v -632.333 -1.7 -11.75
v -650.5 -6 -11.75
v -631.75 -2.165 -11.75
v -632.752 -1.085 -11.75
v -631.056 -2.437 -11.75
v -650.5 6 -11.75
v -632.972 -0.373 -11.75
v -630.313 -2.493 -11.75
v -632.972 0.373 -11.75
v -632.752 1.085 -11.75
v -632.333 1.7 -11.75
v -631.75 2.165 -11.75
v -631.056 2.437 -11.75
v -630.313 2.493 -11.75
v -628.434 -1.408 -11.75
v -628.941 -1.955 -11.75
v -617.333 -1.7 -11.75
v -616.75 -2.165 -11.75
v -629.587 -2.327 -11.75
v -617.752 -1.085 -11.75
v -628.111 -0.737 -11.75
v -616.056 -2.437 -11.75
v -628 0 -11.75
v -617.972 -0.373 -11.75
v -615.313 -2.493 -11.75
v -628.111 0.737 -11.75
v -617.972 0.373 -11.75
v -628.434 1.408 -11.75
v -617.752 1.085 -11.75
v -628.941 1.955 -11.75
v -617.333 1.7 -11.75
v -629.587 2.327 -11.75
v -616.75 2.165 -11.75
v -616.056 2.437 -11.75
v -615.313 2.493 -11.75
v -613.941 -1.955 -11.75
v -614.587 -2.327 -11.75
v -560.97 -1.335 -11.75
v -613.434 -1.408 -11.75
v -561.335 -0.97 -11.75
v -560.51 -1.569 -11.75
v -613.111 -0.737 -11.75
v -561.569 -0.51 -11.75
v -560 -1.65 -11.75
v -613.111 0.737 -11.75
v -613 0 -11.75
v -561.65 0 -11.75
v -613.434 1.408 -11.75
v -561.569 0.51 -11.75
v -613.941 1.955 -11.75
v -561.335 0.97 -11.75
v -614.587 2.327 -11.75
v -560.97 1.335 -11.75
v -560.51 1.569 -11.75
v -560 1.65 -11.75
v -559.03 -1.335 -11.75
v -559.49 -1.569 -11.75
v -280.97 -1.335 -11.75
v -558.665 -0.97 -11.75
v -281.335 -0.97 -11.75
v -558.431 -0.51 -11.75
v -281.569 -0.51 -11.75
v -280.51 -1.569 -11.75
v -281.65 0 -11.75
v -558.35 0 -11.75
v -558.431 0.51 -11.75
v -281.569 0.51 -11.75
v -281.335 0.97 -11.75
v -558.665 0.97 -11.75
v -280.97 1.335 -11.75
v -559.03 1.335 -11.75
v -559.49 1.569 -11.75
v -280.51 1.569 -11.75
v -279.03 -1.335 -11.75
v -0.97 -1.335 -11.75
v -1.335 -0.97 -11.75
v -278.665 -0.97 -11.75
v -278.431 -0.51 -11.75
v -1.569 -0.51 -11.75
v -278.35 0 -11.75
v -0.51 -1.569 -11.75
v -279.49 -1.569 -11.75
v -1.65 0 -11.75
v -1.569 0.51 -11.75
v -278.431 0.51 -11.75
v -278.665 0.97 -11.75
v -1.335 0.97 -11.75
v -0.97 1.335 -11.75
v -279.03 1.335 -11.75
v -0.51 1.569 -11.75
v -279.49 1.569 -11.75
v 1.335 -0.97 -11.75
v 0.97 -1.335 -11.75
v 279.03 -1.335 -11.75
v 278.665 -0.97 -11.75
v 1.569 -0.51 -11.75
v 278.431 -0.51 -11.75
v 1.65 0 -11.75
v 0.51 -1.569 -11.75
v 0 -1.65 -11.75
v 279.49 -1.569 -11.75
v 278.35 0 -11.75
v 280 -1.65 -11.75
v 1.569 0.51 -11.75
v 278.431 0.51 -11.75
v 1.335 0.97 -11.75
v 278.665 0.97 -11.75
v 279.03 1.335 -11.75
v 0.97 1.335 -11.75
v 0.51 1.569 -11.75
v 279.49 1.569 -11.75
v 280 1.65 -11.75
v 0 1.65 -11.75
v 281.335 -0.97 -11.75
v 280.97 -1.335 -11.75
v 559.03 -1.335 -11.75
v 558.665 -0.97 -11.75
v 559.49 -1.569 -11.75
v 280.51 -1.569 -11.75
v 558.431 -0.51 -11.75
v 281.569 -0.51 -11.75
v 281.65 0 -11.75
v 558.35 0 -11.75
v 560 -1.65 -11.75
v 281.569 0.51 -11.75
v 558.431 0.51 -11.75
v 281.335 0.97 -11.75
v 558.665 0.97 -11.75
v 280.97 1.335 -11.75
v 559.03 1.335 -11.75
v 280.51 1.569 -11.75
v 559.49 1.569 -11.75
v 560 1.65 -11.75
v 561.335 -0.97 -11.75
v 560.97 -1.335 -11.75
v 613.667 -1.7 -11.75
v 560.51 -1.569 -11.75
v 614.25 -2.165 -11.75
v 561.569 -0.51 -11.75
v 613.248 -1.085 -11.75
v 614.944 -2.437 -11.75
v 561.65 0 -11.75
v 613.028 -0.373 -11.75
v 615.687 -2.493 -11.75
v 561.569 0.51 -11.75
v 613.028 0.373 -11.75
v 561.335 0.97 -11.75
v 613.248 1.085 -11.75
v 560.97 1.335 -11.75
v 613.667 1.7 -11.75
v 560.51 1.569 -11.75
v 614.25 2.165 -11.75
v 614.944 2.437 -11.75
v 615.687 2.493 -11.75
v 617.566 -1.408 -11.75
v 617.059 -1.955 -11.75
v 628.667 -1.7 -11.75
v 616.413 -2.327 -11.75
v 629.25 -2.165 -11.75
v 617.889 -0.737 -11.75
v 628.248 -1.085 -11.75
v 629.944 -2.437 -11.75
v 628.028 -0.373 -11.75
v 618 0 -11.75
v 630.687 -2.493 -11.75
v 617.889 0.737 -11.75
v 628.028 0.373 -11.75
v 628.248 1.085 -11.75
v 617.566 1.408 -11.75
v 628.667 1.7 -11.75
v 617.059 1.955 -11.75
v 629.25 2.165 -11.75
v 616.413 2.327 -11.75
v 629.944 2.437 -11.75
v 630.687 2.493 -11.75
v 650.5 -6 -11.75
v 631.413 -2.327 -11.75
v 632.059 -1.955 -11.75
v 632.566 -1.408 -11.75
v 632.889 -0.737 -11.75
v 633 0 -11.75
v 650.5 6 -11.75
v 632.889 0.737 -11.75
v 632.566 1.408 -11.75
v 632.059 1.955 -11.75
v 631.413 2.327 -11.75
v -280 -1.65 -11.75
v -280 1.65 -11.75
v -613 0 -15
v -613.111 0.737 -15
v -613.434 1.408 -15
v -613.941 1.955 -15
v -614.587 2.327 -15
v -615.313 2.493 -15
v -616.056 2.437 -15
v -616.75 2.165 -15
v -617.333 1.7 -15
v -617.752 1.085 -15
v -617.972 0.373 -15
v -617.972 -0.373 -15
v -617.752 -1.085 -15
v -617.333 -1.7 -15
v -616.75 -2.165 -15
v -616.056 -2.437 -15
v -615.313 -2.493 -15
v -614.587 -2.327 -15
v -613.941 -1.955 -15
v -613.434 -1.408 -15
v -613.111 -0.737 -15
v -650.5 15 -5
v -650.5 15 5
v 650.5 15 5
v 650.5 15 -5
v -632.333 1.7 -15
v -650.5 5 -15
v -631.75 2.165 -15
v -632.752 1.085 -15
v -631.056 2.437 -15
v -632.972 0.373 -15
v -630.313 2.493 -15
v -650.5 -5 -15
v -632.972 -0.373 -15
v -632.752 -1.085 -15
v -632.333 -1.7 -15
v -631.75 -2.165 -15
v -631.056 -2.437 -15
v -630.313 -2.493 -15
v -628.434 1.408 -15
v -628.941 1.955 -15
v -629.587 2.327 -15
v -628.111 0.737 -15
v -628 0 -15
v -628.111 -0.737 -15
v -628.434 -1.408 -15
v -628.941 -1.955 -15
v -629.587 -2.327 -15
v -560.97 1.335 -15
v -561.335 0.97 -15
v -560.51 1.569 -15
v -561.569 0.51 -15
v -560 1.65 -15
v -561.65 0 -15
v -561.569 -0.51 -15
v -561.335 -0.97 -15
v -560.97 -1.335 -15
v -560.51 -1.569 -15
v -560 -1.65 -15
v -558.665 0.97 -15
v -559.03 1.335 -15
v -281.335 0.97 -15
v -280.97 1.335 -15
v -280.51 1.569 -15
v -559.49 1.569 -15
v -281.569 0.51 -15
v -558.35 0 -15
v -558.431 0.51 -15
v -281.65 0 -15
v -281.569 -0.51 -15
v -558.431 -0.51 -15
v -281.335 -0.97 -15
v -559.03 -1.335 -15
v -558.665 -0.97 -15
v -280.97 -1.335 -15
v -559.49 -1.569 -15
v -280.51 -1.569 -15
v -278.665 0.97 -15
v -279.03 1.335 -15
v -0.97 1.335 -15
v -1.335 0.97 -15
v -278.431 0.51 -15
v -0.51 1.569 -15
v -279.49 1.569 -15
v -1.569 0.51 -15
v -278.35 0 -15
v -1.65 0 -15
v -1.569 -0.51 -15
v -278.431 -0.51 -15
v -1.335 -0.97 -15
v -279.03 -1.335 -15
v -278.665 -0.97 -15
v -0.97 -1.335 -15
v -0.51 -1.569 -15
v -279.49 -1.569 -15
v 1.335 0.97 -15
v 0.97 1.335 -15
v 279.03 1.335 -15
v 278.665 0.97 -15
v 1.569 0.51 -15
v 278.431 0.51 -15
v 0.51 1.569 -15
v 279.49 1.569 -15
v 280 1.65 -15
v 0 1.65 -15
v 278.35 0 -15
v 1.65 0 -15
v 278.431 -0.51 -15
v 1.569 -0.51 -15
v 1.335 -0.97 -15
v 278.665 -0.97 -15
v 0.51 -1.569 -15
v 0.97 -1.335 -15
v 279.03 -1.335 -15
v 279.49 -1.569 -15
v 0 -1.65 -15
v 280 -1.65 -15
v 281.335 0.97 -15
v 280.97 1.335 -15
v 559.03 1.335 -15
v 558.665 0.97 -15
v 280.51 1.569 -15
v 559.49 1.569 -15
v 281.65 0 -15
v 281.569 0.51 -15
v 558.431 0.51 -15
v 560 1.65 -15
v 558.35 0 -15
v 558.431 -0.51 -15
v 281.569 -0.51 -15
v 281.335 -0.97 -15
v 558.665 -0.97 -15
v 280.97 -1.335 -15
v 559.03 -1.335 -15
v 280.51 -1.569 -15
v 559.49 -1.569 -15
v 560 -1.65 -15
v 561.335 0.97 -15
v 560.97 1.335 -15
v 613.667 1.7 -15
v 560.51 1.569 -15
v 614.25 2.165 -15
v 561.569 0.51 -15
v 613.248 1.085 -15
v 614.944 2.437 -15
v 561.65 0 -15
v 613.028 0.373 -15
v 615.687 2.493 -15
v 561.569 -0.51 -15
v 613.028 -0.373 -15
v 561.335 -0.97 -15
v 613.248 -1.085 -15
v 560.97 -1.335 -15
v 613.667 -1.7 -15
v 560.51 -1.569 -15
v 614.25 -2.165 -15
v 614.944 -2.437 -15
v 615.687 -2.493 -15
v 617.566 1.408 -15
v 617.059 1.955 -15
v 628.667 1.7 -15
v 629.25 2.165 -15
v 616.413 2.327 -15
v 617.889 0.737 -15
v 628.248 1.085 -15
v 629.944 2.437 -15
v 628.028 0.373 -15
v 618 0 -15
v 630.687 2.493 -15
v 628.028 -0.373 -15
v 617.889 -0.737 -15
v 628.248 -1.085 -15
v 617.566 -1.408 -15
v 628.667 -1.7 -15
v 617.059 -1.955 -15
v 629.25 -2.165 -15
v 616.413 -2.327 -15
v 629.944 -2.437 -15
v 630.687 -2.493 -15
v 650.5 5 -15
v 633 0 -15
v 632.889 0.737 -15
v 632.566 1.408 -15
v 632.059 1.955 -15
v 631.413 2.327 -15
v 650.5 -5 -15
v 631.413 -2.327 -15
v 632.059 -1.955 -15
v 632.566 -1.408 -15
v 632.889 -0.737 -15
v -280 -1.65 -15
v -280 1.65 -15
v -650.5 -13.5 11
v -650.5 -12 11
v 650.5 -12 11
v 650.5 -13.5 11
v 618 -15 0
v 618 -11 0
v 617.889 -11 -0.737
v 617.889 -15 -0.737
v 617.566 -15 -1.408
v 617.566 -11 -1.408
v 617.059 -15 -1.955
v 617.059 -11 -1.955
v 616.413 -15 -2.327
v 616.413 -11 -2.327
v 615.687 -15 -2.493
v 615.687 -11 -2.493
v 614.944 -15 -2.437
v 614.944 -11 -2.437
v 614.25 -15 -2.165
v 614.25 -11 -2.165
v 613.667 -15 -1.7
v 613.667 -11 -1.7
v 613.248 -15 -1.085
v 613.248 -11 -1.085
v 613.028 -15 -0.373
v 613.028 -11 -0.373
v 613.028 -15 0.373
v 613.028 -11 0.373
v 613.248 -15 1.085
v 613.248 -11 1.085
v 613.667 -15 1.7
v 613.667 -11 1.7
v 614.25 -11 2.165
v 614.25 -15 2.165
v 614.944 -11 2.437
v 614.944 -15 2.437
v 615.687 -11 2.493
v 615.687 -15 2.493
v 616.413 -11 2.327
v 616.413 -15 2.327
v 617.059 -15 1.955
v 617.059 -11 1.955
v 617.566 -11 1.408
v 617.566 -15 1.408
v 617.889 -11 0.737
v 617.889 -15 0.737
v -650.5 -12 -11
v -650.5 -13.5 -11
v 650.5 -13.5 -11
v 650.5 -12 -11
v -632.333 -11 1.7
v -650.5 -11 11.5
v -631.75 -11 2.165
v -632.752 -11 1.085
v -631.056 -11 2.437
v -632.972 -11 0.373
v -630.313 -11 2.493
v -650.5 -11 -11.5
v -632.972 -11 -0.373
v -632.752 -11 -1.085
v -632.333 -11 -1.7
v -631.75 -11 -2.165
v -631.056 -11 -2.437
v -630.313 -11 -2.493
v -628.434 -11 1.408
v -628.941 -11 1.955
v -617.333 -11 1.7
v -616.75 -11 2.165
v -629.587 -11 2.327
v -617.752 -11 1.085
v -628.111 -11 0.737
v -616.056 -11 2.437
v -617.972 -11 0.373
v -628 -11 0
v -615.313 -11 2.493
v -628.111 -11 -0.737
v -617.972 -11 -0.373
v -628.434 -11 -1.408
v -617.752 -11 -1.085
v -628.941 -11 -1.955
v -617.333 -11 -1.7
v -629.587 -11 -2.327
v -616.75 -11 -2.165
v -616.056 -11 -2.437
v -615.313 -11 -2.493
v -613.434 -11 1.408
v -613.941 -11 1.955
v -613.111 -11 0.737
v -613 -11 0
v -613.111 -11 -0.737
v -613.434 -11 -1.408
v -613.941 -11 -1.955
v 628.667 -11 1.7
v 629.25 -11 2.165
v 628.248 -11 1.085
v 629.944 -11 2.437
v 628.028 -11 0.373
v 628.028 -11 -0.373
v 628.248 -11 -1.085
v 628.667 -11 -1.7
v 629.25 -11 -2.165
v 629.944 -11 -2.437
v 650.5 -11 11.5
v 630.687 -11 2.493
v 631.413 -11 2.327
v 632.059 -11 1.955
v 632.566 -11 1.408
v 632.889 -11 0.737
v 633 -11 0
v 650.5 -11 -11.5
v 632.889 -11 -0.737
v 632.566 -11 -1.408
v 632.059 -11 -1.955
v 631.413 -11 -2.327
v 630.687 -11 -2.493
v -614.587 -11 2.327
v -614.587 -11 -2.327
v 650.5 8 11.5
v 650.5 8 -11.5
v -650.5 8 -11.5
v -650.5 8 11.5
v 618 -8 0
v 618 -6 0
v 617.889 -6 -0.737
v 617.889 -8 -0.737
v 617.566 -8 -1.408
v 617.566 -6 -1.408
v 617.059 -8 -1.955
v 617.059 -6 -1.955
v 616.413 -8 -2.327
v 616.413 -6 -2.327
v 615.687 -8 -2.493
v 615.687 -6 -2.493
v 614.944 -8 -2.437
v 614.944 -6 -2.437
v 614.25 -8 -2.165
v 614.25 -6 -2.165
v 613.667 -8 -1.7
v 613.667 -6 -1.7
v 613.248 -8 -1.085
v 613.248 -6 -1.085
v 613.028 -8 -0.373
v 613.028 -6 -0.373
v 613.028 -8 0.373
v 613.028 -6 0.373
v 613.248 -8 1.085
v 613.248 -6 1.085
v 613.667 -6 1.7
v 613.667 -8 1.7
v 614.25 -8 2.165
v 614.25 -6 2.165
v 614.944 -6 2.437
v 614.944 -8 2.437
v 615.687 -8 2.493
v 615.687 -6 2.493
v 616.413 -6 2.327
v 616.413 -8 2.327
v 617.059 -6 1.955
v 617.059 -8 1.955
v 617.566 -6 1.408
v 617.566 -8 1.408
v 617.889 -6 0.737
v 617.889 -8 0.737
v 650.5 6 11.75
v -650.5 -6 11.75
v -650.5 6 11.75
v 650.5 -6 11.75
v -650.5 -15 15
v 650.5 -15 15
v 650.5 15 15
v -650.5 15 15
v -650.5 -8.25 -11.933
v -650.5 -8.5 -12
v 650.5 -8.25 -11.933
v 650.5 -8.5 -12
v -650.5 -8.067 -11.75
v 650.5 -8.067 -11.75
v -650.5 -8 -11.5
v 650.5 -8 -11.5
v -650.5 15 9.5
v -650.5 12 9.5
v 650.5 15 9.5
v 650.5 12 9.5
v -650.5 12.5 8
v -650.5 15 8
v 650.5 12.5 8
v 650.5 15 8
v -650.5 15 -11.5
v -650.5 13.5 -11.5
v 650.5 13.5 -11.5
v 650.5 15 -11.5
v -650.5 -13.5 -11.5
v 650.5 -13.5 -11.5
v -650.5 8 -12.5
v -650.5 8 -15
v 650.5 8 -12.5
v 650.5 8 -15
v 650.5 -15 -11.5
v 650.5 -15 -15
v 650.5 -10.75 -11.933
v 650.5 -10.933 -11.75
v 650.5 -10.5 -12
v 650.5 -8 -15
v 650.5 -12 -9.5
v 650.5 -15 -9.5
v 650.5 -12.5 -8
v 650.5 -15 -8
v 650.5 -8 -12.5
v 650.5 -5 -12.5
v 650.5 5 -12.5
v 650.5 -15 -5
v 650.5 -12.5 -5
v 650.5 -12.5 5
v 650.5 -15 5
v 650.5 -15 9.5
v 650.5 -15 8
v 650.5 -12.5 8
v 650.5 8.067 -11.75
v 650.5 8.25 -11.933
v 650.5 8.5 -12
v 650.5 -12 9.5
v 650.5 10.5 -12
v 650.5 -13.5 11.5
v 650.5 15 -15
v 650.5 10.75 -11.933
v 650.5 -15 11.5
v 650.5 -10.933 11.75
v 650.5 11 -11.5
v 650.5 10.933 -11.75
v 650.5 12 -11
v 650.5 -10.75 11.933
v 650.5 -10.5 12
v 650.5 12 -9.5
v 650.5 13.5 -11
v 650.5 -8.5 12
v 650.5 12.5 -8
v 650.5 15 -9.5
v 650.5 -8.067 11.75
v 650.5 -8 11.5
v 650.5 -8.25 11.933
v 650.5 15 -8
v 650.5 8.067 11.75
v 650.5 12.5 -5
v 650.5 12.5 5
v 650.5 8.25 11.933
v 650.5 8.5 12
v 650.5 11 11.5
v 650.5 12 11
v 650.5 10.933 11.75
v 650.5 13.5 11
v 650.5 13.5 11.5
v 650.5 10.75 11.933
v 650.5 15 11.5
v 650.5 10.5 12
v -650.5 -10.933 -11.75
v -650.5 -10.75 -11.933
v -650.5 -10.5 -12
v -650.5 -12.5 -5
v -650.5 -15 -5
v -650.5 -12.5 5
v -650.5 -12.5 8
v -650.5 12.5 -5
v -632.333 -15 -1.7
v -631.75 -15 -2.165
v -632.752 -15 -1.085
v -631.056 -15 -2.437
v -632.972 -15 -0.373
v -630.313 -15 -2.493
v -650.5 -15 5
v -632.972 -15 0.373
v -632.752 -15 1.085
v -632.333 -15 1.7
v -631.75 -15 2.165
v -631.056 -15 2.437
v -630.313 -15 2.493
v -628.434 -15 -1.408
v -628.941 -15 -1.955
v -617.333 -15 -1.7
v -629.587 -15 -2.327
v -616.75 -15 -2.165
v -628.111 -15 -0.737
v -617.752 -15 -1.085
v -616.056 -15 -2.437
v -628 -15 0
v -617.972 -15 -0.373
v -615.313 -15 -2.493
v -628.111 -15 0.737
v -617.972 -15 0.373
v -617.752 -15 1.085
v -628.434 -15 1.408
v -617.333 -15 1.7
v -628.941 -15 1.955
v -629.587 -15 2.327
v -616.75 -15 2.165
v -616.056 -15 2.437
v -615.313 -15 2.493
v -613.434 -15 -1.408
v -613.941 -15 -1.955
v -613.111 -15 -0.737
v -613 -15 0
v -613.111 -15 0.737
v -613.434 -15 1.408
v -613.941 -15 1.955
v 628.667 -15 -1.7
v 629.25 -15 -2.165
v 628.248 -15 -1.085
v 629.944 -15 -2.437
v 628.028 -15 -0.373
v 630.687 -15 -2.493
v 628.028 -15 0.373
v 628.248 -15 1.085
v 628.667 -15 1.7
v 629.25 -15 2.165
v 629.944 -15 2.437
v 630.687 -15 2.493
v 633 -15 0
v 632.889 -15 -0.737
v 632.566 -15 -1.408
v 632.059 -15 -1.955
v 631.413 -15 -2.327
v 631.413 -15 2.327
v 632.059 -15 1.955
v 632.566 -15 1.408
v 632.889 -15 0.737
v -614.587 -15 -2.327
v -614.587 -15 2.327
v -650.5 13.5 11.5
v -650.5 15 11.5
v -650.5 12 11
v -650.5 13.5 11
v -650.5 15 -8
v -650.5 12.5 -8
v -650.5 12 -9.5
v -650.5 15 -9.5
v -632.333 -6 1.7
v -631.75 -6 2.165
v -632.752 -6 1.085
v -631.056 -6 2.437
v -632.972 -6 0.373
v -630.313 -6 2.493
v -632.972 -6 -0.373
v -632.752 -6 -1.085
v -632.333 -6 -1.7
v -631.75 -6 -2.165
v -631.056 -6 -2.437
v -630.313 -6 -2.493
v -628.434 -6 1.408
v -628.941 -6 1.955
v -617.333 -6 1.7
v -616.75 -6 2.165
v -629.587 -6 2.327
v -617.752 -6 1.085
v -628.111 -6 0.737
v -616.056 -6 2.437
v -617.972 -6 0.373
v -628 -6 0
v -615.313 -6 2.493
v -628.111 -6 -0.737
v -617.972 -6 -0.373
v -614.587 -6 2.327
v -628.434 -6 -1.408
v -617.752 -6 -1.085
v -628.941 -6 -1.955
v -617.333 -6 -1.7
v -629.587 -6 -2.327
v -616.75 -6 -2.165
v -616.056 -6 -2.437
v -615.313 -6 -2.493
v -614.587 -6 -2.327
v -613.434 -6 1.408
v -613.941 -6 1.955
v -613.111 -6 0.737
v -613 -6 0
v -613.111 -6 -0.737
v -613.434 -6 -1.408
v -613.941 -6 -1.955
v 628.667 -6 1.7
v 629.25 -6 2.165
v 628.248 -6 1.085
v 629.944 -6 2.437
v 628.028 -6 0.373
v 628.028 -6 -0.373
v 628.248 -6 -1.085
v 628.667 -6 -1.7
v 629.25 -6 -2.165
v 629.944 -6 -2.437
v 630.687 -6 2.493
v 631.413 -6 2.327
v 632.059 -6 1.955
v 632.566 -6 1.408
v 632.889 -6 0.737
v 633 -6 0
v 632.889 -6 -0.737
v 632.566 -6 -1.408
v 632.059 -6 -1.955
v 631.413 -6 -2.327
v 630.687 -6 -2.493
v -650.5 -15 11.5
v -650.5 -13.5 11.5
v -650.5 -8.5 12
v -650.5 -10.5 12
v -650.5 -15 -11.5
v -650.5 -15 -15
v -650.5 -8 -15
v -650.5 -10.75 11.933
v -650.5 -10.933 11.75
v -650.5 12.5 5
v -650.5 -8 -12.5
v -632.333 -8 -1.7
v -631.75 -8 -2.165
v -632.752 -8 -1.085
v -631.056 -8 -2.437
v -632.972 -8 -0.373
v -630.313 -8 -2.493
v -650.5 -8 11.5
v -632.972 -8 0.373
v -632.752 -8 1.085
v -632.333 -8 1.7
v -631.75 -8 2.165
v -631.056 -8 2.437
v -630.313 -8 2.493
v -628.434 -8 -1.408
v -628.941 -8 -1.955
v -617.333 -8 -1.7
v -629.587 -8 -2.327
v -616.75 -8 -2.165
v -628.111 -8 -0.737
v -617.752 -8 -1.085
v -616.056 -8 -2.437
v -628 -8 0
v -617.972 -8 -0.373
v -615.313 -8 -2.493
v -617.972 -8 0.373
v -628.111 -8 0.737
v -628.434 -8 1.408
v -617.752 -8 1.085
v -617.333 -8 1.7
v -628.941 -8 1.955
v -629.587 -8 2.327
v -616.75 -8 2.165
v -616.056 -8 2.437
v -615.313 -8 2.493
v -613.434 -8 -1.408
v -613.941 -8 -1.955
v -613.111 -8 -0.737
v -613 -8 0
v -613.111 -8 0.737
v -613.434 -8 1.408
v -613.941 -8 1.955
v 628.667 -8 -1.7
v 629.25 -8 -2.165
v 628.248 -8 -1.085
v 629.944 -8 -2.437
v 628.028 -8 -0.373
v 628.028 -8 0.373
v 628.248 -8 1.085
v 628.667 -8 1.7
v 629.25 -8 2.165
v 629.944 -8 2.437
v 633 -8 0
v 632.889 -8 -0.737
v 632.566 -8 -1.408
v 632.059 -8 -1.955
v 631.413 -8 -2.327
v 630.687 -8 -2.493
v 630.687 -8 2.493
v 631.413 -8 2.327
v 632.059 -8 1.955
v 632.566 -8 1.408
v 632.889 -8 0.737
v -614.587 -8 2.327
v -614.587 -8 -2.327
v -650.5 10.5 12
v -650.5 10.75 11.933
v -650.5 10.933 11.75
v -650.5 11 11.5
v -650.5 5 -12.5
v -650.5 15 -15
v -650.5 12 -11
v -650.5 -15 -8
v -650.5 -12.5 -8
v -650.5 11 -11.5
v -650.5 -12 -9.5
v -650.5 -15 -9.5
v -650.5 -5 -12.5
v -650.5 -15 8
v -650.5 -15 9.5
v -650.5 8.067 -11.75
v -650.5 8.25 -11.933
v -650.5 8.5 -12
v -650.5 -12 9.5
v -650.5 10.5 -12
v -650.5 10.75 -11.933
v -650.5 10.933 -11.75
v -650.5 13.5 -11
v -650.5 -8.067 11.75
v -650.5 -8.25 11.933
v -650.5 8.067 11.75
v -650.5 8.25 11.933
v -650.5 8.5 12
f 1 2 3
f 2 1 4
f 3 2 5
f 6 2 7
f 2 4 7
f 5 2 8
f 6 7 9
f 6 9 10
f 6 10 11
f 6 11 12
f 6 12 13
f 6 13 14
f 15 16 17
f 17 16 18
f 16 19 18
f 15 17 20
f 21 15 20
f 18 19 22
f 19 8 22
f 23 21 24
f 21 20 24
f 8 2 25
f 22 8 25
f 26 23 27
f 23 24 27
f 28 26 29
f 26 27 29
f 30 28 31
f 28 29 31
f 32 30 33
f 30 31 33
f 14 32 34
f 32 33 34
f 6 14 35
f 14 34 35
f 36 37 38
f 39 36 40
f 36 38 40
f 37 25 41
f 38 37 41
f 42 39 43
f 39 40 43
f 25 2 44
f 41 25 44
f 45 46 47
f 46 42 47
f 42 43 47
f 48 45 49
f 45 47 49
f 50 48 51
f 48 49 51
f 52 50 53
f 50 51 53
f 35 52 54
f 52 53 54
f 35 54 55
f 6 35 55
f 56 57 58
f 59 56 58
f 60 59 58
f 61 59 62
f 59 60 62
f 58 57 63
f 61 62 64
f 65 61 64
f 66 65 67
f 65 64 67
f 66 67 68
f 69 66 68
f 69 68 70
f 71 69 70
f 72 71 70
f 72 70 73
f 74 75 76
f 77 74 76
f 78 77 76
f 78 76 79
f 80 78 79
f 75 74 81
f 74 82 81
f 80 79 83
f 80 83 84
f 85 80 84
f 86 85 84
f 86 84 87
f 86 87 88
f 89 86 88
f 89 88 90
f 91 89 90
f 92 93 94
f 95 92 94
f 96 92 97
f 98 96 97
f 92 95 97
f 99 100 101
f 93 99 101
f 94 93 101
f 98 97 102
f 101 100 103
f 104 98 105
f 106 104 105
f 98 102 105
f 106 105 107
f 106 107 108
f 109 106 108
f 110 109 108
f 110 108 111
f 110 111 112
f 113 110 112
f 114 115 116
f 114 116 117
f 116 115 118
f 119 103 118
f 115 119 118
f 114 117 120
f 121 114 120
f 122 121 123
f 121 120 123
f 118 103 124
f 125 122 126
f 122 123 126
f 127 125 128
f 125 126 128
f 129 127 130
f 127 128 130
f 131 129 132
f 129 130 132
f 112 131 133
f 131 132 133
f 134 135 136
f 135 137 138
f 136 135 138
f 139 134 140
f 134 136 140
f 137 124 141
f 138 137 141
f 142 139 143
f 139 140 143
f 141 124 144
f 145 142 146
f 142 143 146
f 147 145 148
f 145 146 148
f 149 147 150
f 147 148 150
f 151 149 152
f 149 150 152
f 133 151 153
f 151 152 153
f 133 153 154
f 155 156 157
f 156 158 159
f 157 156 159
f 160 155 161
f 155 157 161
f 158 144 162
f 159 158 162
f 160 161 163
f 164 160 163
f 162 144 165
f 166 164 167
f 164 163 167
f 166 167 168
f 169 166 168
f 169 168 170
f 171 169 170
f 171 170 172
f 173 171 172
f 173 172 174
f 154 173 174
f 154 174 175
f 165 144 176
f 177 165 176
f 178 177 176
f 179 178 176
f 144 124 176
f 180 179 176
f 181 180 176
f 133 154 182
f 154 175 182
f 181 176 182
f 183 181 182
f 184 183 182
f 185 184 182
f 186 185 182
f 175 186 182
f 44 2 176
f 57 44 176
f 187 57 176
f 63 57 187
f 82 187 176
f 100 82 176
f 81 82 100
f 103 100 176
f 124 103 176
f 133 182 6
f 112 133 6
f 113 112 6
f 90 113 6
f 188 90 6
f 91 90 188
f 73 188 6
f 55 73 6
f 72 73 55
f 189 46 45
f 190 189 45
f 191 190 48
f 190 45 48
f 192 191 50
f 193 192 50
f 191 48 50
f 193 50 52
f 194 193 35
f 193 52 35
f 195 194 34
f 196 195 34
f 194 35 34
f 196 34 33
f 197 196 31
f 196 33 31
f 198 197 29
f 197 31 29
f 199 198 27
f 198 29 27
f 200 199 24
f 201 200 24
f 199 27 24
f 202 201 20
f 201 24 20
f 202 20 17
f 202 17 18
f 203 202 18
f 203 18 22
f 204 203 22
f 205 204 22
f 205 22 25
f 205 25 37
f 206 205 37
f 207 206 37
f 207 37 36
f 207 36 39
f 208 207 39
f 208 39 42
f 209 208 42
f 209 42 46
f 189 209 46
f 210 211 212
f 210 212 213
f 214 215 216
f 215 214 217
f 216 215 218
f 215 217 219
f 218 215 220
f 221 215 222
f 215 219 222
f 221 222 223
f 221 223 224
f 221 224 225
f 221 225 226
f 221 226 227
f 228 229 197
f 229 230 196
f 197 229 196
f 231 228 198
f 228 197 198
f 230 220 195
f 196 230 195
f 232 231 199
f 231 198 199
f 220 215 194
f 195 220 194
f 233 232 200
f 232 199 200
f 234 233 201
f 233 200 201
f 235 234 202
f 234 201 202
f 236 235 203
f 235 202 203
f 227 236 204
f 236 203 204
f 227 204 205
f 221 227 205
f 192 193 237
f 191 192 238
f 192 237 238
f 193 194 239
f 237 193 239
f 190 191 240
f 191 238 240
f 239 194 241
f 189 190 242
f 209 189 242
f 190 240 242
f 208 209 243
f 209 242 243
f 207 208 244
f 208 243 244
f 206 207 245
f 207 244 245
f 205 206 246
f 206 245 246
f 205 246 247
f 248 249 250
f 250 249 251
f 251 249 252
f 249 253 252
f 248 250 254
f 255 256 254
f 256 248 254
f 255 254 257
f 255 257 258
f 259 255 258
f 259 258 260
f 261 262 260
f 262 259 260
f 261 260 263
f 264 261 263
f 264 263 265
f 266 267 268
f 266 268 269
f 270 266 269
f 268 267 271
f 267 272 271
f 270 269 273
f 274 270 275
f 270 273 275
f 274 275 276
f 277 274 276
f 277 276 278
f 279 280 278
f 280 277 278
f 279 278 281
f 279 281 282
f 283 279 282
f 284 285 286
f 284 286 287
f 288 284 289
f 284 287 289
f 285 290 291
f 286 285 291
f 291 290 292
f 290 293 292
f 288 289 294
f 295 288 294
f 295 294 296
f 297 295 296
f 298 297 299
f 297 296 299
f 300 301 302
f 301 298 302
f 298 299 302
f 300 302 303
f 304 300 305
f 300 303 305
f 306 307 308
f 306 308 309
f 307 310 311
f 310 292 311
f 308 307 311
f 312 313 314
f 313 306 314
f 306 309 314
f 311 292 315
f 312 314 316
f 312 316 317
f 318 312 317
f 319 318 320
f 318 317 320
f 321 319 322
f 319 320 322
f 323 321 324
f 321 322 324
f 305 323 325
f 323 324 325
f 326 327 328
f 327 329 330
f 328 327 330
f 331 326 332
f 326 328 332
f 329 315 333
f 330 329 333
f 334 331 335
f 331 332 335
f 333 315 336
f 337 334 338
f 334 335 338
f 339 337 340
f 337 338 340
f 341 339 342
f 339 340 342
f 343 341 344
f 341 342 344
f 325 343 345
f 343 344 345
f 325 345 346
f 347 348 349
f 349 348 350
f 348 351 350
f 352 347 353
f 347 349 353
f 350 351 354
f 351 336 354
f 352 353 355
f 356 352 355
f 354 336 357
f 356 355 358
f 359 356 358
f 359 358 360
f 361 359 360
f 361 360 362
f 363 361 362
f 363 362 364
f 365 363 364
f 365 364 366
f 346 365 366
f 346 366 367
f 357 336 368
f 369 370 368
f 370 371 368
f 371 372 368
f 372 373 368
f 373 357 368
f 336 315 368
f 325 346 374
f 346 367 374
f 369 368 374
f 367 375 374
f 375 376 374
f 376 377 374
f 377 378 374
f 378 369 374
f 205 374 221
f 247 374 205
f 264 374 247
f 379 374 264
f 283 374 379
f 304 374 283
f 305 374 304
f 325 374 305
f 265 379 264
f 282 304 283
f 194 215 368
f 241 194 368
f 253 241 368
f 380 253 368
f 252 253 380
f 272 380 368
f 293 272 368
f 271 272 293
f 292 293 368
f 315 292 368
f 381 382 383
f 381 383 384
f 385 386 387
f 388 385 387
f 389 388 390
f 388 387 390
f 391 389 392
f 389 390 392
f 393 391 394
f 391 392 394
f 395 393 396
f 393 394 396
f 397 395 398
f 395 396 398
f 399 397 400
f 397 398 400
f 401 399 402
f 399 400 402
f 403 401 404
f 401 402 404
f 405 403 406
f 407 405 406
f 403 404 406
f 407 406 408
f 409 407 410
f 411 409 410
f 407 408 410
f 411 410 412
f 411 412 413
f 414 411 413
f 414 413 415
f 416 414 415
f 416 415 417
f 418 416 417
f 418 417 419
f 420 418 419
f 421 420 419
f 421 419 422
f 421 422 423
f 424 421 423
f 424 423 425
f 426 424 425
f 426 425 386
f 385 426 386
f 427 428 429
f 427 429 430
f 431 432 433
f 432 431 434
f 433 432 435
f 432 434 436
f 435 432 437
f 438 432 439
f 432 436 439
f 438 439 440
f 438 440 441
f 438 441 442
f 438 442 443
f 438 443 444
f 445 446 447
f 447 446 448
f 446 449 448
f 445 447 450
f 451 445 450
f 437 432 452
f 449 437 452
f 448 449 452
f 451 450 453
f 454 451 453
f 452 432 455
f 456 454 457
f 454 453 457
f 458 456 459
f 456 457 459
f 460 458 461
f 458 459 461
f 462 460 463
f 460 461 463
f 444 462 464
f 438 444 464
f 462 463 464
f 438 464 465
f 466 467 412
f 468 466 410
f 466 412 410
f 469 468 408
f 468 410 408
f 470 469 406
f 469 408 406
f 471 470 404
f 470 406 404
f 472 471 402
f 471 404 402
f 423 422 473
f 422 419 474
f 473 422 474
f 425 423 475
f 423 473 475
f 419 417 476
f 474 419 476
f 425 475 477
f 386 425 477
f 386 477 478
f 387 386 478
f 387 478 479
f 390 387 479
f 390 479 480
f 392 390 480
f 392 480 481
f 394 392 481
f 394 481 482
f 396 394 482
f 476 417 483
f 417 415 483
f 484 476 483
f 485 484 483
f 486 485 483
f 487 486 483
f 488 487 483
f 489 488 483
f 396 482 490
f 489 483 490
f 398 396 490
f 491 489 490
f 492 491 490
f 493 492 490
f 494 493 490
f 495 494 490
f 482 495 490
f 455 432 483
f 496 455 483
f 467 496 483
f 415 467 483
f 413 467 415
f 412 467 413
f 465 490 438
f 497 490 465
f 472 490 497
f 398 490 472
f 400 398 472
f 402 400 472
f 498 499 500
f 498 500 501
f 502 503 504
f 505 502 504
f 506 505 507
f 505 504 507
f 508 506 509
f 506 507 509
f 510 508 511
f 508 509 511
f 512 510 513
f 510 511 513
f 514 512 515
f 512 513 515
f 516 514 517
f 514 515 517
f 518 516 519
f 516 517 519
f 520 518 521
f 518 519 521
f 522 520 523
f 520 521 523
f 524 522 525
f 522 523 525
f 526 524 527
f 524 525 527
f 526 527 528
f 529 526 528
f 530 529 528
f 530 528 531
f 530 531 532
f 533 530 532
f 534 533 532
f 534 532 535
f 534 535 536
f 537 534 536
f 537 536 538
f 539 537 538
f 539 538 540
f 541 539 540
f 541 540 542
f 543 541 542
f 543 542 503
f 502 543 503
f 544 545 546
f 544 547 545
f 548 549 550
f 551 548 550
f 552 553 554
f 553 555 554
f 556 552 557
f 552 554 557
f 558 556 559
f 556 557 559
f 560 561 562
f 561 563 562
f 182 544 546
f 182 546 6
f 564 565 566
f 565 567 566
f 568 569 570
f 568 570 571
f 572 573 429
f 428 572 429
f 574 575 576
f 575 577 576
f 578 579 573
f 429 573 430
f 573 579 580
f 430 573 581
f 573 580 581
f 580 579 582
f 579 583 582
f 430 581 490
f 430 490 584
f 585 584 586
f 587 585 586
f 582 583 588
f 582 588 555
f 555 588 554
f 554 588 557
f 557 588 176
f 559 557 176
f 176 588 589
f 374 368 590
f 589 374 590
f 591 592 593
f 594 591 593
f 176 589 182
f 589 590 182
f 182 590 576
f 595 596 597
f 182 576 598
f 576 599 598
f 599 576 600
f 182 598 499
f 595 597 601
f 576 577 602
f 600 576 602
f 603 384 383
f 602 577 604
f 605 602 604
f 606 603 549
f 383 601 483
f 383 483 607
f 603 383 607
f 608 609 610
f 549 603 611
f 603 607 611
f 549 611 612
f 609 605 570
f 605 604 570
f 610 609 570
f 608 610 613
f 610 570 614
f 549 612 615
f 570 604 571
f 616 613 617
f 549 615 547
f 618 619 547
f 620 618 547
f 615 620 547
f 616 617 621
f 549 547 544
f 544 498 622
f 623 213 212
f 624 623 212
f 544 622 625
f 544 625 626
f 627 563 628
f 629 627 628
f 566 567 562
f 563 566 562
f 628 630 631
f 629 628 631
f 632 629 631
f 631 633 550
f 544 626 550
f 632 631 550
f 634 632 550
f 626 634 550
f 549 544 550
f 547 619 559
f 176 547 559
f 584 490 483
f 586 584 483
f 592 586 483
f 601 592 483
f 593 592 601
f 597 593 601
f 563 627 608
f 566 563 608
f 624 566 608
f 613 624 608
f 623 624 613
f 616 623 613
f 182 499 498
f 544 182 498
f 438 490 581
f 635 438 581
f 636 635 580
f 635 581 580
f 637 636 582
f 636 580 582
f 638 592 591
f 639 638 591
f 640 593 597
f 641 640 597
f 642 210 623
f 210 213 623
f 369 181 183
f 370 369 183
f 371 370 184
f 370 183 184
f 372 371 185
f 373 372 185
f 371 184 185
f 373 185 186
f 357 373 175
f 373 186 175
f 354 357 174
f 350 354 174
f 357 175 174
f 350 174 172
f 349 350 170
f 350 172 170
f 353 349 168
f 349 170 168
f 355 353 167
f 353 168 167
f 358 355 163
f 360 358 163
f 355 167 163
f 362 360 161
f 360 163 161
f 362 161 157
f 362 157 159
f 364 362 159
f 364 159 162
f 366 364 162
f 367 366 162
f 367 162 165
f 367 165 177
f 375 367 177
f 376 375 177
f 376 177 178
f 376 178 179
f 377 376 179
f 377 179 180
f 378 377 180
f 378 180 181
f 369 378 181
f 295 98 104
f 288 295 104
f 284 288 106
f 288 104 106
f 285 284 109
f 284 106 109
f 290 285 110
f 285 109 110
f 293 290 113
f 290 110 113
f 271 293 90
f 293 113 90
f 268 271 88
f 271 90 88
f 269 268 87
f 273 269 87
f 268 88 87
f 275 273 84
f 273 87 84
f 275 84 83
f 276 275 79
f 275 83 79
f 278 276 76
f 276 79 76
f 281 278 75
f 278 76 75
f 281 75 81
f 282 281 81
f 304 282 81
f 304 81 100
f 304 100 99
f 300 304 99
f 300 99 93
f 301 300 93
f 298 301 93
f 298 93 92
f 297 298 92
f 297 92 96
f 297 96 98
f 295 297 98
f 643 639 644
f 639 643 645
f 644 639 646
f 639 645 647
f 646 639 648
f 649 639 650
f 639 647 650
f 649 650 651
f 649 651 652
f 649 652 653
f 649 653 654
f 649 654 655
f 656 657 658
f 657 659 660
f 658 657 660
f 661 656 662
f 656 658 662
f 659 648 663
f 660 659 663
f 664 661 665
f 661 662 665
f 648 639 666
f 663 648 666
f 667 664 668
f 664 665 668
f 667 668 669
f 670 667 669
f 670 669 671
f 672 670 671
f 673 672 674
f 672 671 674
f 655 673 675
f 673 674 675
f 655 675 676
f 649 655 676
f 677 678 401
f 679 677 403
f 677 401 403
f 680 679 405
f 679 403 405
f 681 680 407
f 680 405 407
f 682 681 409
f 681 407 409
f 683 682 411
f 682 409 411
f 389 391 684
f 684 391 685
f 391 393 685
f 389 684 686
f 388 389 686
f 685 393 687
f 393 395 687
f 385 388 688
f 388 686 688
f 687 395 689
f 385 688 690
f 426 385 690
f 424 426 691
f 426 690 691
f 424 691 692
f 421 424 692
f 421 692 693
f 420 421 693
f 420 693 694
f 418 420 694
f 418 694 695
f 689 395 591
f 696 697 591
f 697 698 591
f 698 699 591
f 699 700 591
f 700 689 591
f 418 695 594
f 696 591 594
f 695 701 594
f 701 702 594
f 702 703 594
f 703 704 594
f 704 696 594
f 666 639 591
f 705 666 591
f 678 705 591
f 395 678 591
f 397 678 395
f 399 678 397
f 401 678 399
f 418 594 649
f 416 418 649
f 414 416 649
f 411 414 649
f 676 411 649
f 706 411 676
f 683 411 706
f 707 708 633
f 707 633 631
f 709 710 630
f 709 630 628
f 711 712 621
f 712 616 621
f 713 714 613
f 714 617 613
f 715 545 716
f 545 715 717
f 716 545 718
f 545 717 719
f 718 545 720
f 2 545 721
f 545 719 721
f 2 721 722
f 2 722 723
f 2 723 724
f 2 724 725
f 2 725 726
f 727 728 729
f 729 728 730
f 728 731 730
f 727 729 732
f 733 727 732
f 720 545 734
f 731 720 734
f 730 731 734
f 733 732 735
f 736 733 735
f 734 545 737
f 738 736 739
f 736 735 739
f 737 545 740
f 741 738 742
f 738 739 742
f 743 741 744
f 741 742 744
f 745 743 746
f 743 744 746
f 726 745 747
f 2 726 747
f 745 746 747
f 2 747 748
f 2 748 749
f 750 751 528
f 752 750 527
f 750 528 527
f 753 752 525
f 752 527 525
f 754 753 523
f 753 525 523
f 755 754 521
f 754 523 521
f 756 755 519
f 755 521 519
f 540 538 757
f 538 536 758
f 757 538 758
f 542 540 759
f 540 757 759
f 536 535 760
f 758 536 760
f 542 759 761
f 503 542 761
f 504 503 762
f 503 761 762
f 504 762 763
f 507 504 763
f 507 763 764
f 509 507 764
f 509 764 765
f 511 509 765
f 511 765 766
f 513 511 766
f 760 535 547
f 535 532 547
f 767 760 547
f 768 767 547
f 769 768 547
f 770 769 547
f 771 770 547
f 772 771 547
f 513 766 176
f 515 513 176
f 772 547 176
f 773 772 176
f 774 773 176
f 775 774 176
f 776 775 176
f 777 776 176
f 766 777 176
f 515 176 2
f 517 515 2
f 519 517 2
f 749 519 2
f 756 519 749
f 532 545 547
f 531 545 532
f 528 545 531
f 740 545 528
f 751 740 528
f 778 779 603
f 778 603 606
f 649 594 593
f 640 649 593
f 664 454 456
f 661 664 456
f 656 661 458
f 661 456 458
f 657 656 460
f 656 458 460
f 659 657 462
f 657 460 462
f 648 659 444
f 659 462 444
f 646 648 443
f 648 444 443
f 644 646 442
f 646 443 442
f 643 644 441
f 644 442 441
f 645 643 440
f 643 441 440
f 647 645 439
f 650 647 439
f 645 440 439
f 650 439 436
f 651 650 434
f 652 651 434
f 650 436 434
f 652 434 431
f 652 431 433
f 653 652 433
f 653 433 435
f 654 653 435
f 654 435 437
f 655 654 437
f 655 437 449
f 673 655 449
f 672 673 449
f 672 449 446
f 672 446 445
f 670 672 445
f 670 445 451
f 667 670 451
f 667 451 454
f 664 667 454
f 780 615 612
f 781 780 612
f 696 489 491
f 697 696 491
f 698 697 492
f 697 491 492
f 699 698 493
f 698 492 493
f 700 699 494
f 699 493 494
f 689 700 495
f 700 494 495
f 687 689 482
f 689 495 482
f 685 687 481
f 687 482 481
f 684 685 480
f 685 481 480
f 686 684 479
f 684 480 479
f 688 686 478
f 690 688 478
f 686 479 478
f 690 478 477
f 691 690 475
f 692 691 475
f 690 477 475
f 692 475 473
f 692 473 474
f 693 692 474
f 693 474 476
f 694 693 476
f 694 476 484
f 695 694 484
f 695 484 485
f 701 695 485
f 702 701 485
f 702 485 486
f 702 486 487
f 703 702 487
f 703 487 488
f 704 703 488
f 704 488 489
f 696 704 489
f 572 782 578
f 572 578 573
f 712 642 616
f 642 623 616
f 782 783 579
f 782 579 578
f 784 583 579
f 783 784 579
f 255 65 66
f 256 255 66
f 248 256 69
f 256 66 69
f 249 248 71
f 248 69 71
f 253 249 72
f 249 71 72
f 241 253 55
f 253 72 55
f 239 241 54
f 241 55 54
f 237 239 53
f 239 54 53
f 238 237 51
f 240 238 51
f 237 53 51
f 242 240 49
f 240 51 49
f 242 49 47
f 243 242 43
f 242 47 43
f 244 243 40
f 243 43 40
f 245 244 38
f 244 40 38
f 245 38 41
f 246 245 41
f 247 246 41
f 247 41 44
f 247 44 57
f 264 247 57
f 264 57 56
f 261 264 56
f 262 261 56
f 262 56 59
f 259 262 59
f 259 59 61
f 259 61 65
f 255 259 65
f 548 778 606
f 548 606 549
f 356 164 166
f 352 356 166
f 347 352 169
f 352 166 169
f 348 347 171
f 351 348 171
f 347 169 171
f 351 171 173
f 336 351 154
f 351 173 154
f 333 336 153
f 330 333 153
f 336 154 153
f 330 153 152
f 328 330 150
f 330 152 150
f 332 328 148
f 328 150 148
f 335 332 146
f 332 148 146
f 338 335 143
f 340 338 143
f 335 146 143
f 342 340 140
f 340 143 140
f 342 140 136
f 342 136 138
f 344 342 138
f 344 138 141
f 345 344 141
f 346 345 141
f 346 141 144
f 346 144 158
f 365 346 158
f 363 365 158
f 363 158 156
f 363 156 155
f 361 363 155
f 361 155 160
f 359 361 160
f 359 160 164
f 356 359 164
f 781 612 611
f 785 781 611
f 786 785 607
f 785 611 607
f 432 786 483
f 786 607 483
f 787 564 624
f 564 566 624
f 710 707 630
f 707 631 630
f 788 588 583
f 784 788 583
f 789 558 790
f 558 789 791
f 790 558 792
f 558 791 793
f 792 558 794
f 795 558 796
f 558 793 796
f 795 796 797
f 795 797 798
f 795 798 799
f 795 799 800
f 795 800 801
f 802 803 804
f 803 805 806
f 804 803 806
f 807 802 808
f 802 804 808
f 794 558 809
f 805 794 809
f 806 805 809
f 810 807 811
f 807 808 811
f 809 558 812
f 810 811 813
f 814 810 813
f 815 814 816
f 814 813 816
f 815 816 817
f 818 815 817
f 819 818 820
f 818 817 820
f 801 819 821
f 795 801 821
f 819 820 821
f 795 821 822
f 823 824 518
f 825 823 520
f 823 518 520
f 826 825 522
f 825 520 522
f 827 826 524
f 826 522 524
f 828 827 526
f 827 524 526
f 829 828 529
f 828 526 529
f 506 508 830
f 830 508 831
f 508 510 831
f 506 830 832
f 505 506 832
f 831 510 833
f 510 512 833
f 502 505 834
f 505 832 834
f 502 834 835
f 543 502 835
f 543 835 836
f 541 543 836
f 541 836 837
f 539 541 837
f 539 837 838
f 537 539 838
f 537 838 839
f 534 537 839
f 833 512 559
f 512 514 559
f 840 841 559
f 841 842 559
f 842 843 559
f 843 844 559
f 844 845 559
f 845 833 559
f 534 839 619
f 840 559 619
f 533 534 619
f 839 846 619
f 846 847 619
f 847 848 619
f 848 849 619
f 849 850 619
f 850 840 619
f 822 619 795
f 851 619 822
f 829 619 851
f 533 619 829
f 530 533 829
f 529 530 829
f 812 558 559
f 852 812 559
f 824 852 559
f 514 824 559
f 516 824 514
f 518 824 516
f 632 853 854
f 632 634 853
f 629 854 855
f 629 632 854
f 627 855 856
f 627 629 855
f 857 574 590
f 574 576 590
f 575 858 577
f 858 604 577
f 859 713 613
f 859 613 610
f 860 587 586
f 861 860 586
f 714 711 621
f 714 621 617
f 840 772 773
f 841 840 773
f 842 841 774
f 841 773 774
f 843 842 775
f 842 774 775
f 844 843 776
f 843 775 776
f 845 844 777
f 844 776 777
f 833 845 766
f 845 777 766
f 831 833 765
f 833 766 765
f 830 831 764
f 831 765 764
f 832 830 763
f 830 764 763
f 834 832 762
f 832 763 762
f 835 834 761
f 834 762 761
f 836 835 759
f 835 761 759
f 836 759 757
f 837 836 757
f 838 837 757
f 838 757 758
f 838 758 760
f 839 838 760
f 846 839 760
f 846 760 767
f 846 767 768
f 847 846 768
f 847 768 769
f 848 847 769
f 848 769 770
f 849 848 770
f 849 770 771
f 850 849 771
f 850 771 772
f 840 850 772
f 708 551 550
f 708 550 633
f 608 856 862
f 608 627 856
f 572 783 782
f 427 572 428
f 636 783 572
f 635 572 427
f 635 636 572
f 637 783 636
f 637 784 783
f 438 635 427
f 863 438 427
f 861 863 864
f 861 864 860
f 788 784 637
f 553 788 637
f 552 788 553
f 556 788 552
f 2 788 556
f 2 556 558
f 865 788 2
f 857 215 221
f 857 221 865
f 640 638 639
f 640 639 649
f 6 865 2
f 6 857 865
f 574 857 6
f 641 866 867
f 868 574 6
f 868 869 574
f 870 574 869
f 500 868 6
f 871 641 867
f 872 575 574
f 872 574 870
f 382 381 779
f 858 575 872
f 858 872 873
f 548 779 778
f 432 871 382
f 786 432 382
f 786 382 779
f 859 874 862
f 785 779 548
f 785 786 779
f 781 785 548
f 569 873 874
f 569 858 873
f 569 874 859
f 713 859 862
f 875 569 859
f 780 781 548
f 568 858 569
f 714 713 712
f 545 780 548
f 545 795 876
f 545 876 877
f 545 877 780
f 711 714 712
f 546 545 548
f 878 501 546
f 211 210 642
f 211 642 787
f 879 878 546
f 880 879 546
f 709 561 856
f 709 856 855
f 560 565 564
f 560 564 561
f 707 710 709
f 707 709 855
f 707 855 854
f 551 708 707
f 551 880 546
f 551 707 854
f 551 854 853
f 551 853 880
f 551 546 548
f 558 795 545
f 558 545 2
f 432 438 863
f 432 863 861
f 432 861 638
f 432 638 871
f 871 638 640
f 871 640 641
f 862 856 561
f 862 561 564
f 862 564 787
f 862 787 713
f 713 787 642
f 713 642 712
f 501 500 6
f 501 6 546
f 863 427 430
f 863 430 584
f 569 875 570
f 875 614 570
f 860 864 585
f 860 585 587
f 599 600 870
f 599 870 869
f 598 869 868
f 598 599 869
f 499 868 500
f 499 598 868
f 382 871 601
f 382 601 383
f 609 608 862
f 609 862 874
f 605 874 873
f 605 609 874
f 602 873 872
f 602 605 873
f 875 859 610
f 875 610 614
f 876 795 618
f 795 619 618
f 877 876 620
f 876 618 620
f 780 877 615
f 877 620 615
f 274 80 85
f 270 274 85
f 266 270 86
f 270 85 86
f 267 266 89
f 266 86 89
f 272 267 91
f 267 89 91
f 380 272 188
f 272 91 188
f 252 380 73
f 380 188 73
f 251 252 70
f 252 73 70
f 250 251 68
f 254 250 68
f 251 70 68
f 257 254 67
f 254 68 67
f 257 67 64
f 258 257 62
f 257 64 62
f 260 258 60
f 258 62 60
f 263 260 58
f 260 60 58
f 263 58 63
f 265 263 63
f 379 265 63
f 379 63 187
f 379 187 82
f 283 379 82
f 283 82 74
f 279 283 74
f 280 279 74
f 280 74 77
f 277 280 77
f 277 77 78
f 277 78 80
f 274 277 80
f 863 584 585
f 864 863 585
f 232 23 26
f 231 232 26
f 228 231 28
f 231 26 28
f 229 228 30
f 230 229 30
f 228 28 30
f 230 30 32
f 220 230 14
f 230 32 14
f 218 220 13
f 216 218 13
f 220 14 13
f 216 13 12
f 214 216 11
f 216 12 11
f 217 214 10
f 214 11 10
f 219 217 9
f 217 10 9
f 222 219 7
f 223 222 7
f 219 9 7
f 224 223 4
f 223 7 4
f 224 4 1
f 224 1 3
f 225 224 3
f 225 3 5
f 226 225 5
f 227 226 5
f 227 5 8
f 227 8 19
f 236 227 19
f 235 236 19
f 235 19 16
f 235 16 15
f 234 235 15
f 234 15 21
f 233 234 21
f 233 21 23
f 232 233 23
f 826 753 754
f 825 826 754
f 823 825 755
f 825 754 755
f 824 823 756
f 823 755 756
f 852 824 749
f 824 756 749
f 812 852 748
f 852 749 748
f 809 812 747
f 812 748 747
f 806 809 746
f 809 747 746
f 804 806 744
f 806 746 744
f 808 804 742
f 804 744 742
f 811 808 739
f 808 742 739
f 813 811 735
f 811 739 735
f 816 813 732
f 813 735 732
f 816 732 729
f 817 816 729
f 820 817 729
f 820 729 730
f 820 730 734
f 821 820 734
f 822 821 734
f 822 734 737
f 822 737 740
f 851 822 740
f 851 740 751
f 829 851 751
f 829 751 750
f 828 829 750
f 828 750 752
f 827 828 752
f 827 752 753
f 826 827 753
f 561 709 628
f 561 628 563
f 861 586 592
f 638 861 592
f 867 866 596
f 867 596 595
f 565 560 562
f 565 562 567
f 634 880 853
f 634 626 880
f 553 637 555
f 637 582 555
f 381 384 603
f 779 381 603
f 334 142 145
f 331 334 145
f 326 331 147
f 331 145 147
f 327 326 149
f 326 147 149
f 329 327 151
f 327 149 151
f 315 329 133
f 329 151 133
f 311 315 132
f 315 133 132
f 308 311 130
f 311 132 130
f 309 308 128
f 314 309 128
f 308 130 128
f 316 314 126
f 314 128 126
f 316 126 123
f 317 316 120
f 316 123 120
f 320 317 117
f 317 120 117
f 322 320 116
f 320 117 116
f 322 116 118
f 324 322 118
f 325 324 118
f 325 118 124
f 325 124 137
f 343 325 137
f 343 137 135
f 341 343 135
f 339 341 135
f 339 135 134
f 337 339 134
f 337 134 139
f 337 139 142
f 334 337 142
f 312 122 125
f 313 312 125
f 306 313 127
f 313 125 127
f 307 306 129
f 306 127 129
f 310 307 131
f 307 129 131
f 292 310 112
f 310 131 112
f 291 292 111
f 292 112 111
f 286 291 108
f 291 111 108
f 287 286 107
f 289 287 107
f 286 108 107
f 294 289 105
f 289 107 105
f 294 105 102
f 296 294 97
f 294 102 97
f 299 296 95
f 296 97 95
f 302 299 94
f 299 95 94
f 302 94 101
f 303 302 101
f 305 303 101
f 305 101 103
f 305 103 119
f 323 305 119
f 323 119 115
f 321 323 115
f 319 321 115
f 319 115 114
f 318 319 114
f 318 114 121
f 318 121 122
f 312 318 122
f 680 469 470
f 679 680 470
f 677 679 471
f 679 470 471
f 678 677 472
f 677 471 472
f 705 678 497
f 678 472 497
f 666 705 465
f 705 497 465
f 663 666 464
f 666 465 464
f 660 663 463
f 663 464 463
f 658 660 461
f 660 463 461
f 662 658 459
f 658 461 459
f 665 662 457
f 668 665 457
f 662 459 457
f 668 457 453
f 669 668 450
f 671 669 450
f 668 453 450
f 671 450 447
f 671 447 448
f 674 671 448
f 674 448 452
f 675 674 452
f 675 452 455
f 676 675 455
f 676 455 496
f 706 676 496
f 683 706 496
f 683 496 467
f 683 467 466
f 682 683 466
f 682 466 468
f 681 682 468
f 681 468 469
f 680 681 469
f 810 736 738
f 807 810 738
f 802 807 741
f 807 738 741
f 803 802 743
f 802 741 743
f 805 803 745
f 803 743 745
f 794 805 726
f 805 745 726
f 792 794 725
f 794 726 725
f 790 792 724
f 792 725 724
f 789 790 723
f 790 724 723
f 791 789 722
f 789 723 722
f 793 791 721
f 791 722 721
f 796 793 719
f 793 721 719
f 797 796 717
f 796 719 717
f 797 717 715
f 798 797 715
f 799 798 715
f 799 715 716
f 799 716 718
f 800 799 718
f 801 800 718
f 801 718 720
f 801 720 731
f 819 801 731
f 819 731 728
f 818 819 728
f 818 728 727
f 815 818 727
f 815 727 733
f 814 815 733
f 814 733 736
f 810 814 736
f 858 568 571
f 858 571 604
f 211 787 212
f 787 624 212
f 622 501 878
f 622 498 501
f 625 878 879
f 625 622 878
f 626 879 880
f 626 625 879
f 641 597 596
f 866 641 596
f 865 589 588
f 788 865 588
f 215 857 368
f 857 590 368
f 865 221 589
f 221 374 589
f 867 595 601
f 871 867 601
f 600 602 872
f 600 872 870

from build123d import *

# Parameters (mm, degrees)
SKETCH_1_W             = 23.5
SKETCH_1_H             = 12
EXTRUDE_1_DEPTH        = 650.5
HOLE_WIZARD_M6_1_D     = 5
HOLE_WIZARD_M6_1_DEPTH = 19
HOLE_WIZARD_M6_1_TIP   = 1.502151548
HOLE_WIZARD_M6_2_D     = 5
HOLE_WIZARD_M6_2_DEPTH = 19
HOLE_WIZARD_M6_2_TIP   = 1.502151548
HOLE_WIZARD_M4_1_D     = 3.3
HOLE_WIZARD_M4_1_DEPTH = 15
HOLE_WIZARD_M4_1_TIP   = 0.991420021


with BuildPart() as part:
    # 草图1 → 凸台-拉伸1 (new, symmetric)
    with BuildSketch(Plane(origin=(0, 0, 0), x_dir=(0, 0, -1), z_dir=(1, 0, 0))):
        Polygon((-15, 15), (-11.5, 15), (-11.5, 13.5), (-11, 13.5), (-11, 12), (-9.5, 12), (-9.5, 15), (-8, 15), (-8, 12.5), (-5, 12.5), (-5, 15), (5, 15), (5, 12.5), (8, 12.5), (8, 15), (9.5, 15), (9.5, 12), (11, 12), (11, 13.5), (11.5, 13.5), (11.5, 15), (15, 15), (15, 8), (12.5, 8), (12.5, 5), (15, 5), (15, -5), (12.5, -5), (12.5, -8), (15, -8), (15, -15), (11.5, -15), (11.5, -13.5), (11, -13.5), (11, -12), (9.5, -12), (9.5, -15), (8, -15), (8, -12.5), (5, -12.5), (5, -15), (-5, -15), (-5, -12.5), (-8, -12.5), (-8, -15), (-9.5, -15), (-9.5, -12), (-11, -12), (-11, -13.5), (-11.5, -13.5), (-11.5, -15), (-15, -15), align=None)
        with BuildLine():
            Line((12, -10.5), (12, -8.5))
            ThreePointArc((12, -8.5), (11.853553391, -8.146446609), (11.5, -8))
            Line((11.5, -8), (-11.5, -8))
            ThreePointArc((-11.5, -8), (-11.853553391, -8.146446609), (-12, -8.5))
            Line((-12, -8.5), (-12, -10.5))
            ThreePointArc((-12, -10.5), (-11.853553391, -10.853553391), (-11.5, -11))
            Line((-11.5, -11), (11.5, -11))
            ThreePointArc((11.5, -11), (11.853553391, -10.853553391), (12, -10.5))
        make_face(mode=Mode.SUBTRACT)
        with BuildLine():
            Line((-11.5, 11), (11.5, 11))
            ThreePointArc((11.5, 11), (11.853553391, 10.853553391), (12, 10.5))
            Line((12, 10.5), (12, 8.5))
            ThreePointArc((12, 8.5), (11.853553391, 8.146446609), (11.5, 8))
            Line((11.5, 8), (-11.5, 8))
            ThreePointArc((-11.5, 8), (-11.853553391, 8.146446609), (-12, 8.5))
            Line((-12, 8.5), (-12, 10.5))
            ThreePointArc((-12, 10.5), (-11.853553391, 10.853553391), (-11.5, 11))
        make_face(mode=Mode.SUBTRACT)
        Rectangle(SKETCH_1_W, SKETCH_1_H, mode=Mode.SUBTRACT)
    extrude(amount=EXTRUDE_1_DEPTH, both=True)

    # M6 螺纹孔1
    with Locations(Plane(origin=(0, -15, 0), x_dir=(-1, 0, 0), z_dir=(0, -1, 0))):
        with Locations((615.5, 0), (630.5, 0), (-615.5, 0), (-630.5, 0)):
            Hole(HOLE_WIZARD_M6_1_D / 2, depth=HOLE_WIZARD_M6_1_DEPTH)
            with Locations((0, 0, -(HOLE_WIZARD_M6_1_DEPTH + HOLE_WIZARD_M6_1_TIP / 2))):  # 118° drill point
                Cone(0, HOLE_WIZARD_M6_1_D / 2, HOLE_WIZARD_M6_1_TIP, mode=Mode.SUBTRACT)

    # M6 螺纹孔2
    with Locations(Plane(origin=(0, 0, -15), x_dir=(-1, 0, 0), z_dir=(0, 0, -1))):
        with Locations((-630.5, 0), (-615.5, 0), (630.5, 0), (615.5, 0)):
            Hole(HOLE_WIZARD_M6_2_D / 2, depth=HOLE_WIZARD_M6_2_DEPTH)
            with Locations((0, 0, -(HOLE_WIZARD_M6_2_DEPTH + HOLE_WIZARD_M6_2_TIP / 2))):  # 118° drill point
                Cone(0, HOLE_WIZARD_M6_2_D / 2, HOLE_WIZARD_M6_2_TIP, mode=Mode.SUBTRACT)

    # M4 螺纹孔1
    with Locations(Plane(origin=(0, 0, -15), x_dir=(-1, 0, 0), z_dir=(0, 0, -1))):
        with Locations((560, 0), (280, 0), (0, 0), (-280, 0), (-560, 0)):
            Hole(HOLE_WIZARD_M4_1_D / 2, depth=HOLE_WIZARD_M4_1_DEPTH)
            with Locations((0, 0, -(HOLE_WIZARD_M4_1_DEPTH + HOLE_WIZARD_M4_1_TIP / 2))):  # 118° drill point
                Cone(0, HOLE_WIZARD_M4_1_D / 2, HOLE_WIZARD_M4_1_TIP, mode=Mode.SUBTRACT)


solid = part.part
